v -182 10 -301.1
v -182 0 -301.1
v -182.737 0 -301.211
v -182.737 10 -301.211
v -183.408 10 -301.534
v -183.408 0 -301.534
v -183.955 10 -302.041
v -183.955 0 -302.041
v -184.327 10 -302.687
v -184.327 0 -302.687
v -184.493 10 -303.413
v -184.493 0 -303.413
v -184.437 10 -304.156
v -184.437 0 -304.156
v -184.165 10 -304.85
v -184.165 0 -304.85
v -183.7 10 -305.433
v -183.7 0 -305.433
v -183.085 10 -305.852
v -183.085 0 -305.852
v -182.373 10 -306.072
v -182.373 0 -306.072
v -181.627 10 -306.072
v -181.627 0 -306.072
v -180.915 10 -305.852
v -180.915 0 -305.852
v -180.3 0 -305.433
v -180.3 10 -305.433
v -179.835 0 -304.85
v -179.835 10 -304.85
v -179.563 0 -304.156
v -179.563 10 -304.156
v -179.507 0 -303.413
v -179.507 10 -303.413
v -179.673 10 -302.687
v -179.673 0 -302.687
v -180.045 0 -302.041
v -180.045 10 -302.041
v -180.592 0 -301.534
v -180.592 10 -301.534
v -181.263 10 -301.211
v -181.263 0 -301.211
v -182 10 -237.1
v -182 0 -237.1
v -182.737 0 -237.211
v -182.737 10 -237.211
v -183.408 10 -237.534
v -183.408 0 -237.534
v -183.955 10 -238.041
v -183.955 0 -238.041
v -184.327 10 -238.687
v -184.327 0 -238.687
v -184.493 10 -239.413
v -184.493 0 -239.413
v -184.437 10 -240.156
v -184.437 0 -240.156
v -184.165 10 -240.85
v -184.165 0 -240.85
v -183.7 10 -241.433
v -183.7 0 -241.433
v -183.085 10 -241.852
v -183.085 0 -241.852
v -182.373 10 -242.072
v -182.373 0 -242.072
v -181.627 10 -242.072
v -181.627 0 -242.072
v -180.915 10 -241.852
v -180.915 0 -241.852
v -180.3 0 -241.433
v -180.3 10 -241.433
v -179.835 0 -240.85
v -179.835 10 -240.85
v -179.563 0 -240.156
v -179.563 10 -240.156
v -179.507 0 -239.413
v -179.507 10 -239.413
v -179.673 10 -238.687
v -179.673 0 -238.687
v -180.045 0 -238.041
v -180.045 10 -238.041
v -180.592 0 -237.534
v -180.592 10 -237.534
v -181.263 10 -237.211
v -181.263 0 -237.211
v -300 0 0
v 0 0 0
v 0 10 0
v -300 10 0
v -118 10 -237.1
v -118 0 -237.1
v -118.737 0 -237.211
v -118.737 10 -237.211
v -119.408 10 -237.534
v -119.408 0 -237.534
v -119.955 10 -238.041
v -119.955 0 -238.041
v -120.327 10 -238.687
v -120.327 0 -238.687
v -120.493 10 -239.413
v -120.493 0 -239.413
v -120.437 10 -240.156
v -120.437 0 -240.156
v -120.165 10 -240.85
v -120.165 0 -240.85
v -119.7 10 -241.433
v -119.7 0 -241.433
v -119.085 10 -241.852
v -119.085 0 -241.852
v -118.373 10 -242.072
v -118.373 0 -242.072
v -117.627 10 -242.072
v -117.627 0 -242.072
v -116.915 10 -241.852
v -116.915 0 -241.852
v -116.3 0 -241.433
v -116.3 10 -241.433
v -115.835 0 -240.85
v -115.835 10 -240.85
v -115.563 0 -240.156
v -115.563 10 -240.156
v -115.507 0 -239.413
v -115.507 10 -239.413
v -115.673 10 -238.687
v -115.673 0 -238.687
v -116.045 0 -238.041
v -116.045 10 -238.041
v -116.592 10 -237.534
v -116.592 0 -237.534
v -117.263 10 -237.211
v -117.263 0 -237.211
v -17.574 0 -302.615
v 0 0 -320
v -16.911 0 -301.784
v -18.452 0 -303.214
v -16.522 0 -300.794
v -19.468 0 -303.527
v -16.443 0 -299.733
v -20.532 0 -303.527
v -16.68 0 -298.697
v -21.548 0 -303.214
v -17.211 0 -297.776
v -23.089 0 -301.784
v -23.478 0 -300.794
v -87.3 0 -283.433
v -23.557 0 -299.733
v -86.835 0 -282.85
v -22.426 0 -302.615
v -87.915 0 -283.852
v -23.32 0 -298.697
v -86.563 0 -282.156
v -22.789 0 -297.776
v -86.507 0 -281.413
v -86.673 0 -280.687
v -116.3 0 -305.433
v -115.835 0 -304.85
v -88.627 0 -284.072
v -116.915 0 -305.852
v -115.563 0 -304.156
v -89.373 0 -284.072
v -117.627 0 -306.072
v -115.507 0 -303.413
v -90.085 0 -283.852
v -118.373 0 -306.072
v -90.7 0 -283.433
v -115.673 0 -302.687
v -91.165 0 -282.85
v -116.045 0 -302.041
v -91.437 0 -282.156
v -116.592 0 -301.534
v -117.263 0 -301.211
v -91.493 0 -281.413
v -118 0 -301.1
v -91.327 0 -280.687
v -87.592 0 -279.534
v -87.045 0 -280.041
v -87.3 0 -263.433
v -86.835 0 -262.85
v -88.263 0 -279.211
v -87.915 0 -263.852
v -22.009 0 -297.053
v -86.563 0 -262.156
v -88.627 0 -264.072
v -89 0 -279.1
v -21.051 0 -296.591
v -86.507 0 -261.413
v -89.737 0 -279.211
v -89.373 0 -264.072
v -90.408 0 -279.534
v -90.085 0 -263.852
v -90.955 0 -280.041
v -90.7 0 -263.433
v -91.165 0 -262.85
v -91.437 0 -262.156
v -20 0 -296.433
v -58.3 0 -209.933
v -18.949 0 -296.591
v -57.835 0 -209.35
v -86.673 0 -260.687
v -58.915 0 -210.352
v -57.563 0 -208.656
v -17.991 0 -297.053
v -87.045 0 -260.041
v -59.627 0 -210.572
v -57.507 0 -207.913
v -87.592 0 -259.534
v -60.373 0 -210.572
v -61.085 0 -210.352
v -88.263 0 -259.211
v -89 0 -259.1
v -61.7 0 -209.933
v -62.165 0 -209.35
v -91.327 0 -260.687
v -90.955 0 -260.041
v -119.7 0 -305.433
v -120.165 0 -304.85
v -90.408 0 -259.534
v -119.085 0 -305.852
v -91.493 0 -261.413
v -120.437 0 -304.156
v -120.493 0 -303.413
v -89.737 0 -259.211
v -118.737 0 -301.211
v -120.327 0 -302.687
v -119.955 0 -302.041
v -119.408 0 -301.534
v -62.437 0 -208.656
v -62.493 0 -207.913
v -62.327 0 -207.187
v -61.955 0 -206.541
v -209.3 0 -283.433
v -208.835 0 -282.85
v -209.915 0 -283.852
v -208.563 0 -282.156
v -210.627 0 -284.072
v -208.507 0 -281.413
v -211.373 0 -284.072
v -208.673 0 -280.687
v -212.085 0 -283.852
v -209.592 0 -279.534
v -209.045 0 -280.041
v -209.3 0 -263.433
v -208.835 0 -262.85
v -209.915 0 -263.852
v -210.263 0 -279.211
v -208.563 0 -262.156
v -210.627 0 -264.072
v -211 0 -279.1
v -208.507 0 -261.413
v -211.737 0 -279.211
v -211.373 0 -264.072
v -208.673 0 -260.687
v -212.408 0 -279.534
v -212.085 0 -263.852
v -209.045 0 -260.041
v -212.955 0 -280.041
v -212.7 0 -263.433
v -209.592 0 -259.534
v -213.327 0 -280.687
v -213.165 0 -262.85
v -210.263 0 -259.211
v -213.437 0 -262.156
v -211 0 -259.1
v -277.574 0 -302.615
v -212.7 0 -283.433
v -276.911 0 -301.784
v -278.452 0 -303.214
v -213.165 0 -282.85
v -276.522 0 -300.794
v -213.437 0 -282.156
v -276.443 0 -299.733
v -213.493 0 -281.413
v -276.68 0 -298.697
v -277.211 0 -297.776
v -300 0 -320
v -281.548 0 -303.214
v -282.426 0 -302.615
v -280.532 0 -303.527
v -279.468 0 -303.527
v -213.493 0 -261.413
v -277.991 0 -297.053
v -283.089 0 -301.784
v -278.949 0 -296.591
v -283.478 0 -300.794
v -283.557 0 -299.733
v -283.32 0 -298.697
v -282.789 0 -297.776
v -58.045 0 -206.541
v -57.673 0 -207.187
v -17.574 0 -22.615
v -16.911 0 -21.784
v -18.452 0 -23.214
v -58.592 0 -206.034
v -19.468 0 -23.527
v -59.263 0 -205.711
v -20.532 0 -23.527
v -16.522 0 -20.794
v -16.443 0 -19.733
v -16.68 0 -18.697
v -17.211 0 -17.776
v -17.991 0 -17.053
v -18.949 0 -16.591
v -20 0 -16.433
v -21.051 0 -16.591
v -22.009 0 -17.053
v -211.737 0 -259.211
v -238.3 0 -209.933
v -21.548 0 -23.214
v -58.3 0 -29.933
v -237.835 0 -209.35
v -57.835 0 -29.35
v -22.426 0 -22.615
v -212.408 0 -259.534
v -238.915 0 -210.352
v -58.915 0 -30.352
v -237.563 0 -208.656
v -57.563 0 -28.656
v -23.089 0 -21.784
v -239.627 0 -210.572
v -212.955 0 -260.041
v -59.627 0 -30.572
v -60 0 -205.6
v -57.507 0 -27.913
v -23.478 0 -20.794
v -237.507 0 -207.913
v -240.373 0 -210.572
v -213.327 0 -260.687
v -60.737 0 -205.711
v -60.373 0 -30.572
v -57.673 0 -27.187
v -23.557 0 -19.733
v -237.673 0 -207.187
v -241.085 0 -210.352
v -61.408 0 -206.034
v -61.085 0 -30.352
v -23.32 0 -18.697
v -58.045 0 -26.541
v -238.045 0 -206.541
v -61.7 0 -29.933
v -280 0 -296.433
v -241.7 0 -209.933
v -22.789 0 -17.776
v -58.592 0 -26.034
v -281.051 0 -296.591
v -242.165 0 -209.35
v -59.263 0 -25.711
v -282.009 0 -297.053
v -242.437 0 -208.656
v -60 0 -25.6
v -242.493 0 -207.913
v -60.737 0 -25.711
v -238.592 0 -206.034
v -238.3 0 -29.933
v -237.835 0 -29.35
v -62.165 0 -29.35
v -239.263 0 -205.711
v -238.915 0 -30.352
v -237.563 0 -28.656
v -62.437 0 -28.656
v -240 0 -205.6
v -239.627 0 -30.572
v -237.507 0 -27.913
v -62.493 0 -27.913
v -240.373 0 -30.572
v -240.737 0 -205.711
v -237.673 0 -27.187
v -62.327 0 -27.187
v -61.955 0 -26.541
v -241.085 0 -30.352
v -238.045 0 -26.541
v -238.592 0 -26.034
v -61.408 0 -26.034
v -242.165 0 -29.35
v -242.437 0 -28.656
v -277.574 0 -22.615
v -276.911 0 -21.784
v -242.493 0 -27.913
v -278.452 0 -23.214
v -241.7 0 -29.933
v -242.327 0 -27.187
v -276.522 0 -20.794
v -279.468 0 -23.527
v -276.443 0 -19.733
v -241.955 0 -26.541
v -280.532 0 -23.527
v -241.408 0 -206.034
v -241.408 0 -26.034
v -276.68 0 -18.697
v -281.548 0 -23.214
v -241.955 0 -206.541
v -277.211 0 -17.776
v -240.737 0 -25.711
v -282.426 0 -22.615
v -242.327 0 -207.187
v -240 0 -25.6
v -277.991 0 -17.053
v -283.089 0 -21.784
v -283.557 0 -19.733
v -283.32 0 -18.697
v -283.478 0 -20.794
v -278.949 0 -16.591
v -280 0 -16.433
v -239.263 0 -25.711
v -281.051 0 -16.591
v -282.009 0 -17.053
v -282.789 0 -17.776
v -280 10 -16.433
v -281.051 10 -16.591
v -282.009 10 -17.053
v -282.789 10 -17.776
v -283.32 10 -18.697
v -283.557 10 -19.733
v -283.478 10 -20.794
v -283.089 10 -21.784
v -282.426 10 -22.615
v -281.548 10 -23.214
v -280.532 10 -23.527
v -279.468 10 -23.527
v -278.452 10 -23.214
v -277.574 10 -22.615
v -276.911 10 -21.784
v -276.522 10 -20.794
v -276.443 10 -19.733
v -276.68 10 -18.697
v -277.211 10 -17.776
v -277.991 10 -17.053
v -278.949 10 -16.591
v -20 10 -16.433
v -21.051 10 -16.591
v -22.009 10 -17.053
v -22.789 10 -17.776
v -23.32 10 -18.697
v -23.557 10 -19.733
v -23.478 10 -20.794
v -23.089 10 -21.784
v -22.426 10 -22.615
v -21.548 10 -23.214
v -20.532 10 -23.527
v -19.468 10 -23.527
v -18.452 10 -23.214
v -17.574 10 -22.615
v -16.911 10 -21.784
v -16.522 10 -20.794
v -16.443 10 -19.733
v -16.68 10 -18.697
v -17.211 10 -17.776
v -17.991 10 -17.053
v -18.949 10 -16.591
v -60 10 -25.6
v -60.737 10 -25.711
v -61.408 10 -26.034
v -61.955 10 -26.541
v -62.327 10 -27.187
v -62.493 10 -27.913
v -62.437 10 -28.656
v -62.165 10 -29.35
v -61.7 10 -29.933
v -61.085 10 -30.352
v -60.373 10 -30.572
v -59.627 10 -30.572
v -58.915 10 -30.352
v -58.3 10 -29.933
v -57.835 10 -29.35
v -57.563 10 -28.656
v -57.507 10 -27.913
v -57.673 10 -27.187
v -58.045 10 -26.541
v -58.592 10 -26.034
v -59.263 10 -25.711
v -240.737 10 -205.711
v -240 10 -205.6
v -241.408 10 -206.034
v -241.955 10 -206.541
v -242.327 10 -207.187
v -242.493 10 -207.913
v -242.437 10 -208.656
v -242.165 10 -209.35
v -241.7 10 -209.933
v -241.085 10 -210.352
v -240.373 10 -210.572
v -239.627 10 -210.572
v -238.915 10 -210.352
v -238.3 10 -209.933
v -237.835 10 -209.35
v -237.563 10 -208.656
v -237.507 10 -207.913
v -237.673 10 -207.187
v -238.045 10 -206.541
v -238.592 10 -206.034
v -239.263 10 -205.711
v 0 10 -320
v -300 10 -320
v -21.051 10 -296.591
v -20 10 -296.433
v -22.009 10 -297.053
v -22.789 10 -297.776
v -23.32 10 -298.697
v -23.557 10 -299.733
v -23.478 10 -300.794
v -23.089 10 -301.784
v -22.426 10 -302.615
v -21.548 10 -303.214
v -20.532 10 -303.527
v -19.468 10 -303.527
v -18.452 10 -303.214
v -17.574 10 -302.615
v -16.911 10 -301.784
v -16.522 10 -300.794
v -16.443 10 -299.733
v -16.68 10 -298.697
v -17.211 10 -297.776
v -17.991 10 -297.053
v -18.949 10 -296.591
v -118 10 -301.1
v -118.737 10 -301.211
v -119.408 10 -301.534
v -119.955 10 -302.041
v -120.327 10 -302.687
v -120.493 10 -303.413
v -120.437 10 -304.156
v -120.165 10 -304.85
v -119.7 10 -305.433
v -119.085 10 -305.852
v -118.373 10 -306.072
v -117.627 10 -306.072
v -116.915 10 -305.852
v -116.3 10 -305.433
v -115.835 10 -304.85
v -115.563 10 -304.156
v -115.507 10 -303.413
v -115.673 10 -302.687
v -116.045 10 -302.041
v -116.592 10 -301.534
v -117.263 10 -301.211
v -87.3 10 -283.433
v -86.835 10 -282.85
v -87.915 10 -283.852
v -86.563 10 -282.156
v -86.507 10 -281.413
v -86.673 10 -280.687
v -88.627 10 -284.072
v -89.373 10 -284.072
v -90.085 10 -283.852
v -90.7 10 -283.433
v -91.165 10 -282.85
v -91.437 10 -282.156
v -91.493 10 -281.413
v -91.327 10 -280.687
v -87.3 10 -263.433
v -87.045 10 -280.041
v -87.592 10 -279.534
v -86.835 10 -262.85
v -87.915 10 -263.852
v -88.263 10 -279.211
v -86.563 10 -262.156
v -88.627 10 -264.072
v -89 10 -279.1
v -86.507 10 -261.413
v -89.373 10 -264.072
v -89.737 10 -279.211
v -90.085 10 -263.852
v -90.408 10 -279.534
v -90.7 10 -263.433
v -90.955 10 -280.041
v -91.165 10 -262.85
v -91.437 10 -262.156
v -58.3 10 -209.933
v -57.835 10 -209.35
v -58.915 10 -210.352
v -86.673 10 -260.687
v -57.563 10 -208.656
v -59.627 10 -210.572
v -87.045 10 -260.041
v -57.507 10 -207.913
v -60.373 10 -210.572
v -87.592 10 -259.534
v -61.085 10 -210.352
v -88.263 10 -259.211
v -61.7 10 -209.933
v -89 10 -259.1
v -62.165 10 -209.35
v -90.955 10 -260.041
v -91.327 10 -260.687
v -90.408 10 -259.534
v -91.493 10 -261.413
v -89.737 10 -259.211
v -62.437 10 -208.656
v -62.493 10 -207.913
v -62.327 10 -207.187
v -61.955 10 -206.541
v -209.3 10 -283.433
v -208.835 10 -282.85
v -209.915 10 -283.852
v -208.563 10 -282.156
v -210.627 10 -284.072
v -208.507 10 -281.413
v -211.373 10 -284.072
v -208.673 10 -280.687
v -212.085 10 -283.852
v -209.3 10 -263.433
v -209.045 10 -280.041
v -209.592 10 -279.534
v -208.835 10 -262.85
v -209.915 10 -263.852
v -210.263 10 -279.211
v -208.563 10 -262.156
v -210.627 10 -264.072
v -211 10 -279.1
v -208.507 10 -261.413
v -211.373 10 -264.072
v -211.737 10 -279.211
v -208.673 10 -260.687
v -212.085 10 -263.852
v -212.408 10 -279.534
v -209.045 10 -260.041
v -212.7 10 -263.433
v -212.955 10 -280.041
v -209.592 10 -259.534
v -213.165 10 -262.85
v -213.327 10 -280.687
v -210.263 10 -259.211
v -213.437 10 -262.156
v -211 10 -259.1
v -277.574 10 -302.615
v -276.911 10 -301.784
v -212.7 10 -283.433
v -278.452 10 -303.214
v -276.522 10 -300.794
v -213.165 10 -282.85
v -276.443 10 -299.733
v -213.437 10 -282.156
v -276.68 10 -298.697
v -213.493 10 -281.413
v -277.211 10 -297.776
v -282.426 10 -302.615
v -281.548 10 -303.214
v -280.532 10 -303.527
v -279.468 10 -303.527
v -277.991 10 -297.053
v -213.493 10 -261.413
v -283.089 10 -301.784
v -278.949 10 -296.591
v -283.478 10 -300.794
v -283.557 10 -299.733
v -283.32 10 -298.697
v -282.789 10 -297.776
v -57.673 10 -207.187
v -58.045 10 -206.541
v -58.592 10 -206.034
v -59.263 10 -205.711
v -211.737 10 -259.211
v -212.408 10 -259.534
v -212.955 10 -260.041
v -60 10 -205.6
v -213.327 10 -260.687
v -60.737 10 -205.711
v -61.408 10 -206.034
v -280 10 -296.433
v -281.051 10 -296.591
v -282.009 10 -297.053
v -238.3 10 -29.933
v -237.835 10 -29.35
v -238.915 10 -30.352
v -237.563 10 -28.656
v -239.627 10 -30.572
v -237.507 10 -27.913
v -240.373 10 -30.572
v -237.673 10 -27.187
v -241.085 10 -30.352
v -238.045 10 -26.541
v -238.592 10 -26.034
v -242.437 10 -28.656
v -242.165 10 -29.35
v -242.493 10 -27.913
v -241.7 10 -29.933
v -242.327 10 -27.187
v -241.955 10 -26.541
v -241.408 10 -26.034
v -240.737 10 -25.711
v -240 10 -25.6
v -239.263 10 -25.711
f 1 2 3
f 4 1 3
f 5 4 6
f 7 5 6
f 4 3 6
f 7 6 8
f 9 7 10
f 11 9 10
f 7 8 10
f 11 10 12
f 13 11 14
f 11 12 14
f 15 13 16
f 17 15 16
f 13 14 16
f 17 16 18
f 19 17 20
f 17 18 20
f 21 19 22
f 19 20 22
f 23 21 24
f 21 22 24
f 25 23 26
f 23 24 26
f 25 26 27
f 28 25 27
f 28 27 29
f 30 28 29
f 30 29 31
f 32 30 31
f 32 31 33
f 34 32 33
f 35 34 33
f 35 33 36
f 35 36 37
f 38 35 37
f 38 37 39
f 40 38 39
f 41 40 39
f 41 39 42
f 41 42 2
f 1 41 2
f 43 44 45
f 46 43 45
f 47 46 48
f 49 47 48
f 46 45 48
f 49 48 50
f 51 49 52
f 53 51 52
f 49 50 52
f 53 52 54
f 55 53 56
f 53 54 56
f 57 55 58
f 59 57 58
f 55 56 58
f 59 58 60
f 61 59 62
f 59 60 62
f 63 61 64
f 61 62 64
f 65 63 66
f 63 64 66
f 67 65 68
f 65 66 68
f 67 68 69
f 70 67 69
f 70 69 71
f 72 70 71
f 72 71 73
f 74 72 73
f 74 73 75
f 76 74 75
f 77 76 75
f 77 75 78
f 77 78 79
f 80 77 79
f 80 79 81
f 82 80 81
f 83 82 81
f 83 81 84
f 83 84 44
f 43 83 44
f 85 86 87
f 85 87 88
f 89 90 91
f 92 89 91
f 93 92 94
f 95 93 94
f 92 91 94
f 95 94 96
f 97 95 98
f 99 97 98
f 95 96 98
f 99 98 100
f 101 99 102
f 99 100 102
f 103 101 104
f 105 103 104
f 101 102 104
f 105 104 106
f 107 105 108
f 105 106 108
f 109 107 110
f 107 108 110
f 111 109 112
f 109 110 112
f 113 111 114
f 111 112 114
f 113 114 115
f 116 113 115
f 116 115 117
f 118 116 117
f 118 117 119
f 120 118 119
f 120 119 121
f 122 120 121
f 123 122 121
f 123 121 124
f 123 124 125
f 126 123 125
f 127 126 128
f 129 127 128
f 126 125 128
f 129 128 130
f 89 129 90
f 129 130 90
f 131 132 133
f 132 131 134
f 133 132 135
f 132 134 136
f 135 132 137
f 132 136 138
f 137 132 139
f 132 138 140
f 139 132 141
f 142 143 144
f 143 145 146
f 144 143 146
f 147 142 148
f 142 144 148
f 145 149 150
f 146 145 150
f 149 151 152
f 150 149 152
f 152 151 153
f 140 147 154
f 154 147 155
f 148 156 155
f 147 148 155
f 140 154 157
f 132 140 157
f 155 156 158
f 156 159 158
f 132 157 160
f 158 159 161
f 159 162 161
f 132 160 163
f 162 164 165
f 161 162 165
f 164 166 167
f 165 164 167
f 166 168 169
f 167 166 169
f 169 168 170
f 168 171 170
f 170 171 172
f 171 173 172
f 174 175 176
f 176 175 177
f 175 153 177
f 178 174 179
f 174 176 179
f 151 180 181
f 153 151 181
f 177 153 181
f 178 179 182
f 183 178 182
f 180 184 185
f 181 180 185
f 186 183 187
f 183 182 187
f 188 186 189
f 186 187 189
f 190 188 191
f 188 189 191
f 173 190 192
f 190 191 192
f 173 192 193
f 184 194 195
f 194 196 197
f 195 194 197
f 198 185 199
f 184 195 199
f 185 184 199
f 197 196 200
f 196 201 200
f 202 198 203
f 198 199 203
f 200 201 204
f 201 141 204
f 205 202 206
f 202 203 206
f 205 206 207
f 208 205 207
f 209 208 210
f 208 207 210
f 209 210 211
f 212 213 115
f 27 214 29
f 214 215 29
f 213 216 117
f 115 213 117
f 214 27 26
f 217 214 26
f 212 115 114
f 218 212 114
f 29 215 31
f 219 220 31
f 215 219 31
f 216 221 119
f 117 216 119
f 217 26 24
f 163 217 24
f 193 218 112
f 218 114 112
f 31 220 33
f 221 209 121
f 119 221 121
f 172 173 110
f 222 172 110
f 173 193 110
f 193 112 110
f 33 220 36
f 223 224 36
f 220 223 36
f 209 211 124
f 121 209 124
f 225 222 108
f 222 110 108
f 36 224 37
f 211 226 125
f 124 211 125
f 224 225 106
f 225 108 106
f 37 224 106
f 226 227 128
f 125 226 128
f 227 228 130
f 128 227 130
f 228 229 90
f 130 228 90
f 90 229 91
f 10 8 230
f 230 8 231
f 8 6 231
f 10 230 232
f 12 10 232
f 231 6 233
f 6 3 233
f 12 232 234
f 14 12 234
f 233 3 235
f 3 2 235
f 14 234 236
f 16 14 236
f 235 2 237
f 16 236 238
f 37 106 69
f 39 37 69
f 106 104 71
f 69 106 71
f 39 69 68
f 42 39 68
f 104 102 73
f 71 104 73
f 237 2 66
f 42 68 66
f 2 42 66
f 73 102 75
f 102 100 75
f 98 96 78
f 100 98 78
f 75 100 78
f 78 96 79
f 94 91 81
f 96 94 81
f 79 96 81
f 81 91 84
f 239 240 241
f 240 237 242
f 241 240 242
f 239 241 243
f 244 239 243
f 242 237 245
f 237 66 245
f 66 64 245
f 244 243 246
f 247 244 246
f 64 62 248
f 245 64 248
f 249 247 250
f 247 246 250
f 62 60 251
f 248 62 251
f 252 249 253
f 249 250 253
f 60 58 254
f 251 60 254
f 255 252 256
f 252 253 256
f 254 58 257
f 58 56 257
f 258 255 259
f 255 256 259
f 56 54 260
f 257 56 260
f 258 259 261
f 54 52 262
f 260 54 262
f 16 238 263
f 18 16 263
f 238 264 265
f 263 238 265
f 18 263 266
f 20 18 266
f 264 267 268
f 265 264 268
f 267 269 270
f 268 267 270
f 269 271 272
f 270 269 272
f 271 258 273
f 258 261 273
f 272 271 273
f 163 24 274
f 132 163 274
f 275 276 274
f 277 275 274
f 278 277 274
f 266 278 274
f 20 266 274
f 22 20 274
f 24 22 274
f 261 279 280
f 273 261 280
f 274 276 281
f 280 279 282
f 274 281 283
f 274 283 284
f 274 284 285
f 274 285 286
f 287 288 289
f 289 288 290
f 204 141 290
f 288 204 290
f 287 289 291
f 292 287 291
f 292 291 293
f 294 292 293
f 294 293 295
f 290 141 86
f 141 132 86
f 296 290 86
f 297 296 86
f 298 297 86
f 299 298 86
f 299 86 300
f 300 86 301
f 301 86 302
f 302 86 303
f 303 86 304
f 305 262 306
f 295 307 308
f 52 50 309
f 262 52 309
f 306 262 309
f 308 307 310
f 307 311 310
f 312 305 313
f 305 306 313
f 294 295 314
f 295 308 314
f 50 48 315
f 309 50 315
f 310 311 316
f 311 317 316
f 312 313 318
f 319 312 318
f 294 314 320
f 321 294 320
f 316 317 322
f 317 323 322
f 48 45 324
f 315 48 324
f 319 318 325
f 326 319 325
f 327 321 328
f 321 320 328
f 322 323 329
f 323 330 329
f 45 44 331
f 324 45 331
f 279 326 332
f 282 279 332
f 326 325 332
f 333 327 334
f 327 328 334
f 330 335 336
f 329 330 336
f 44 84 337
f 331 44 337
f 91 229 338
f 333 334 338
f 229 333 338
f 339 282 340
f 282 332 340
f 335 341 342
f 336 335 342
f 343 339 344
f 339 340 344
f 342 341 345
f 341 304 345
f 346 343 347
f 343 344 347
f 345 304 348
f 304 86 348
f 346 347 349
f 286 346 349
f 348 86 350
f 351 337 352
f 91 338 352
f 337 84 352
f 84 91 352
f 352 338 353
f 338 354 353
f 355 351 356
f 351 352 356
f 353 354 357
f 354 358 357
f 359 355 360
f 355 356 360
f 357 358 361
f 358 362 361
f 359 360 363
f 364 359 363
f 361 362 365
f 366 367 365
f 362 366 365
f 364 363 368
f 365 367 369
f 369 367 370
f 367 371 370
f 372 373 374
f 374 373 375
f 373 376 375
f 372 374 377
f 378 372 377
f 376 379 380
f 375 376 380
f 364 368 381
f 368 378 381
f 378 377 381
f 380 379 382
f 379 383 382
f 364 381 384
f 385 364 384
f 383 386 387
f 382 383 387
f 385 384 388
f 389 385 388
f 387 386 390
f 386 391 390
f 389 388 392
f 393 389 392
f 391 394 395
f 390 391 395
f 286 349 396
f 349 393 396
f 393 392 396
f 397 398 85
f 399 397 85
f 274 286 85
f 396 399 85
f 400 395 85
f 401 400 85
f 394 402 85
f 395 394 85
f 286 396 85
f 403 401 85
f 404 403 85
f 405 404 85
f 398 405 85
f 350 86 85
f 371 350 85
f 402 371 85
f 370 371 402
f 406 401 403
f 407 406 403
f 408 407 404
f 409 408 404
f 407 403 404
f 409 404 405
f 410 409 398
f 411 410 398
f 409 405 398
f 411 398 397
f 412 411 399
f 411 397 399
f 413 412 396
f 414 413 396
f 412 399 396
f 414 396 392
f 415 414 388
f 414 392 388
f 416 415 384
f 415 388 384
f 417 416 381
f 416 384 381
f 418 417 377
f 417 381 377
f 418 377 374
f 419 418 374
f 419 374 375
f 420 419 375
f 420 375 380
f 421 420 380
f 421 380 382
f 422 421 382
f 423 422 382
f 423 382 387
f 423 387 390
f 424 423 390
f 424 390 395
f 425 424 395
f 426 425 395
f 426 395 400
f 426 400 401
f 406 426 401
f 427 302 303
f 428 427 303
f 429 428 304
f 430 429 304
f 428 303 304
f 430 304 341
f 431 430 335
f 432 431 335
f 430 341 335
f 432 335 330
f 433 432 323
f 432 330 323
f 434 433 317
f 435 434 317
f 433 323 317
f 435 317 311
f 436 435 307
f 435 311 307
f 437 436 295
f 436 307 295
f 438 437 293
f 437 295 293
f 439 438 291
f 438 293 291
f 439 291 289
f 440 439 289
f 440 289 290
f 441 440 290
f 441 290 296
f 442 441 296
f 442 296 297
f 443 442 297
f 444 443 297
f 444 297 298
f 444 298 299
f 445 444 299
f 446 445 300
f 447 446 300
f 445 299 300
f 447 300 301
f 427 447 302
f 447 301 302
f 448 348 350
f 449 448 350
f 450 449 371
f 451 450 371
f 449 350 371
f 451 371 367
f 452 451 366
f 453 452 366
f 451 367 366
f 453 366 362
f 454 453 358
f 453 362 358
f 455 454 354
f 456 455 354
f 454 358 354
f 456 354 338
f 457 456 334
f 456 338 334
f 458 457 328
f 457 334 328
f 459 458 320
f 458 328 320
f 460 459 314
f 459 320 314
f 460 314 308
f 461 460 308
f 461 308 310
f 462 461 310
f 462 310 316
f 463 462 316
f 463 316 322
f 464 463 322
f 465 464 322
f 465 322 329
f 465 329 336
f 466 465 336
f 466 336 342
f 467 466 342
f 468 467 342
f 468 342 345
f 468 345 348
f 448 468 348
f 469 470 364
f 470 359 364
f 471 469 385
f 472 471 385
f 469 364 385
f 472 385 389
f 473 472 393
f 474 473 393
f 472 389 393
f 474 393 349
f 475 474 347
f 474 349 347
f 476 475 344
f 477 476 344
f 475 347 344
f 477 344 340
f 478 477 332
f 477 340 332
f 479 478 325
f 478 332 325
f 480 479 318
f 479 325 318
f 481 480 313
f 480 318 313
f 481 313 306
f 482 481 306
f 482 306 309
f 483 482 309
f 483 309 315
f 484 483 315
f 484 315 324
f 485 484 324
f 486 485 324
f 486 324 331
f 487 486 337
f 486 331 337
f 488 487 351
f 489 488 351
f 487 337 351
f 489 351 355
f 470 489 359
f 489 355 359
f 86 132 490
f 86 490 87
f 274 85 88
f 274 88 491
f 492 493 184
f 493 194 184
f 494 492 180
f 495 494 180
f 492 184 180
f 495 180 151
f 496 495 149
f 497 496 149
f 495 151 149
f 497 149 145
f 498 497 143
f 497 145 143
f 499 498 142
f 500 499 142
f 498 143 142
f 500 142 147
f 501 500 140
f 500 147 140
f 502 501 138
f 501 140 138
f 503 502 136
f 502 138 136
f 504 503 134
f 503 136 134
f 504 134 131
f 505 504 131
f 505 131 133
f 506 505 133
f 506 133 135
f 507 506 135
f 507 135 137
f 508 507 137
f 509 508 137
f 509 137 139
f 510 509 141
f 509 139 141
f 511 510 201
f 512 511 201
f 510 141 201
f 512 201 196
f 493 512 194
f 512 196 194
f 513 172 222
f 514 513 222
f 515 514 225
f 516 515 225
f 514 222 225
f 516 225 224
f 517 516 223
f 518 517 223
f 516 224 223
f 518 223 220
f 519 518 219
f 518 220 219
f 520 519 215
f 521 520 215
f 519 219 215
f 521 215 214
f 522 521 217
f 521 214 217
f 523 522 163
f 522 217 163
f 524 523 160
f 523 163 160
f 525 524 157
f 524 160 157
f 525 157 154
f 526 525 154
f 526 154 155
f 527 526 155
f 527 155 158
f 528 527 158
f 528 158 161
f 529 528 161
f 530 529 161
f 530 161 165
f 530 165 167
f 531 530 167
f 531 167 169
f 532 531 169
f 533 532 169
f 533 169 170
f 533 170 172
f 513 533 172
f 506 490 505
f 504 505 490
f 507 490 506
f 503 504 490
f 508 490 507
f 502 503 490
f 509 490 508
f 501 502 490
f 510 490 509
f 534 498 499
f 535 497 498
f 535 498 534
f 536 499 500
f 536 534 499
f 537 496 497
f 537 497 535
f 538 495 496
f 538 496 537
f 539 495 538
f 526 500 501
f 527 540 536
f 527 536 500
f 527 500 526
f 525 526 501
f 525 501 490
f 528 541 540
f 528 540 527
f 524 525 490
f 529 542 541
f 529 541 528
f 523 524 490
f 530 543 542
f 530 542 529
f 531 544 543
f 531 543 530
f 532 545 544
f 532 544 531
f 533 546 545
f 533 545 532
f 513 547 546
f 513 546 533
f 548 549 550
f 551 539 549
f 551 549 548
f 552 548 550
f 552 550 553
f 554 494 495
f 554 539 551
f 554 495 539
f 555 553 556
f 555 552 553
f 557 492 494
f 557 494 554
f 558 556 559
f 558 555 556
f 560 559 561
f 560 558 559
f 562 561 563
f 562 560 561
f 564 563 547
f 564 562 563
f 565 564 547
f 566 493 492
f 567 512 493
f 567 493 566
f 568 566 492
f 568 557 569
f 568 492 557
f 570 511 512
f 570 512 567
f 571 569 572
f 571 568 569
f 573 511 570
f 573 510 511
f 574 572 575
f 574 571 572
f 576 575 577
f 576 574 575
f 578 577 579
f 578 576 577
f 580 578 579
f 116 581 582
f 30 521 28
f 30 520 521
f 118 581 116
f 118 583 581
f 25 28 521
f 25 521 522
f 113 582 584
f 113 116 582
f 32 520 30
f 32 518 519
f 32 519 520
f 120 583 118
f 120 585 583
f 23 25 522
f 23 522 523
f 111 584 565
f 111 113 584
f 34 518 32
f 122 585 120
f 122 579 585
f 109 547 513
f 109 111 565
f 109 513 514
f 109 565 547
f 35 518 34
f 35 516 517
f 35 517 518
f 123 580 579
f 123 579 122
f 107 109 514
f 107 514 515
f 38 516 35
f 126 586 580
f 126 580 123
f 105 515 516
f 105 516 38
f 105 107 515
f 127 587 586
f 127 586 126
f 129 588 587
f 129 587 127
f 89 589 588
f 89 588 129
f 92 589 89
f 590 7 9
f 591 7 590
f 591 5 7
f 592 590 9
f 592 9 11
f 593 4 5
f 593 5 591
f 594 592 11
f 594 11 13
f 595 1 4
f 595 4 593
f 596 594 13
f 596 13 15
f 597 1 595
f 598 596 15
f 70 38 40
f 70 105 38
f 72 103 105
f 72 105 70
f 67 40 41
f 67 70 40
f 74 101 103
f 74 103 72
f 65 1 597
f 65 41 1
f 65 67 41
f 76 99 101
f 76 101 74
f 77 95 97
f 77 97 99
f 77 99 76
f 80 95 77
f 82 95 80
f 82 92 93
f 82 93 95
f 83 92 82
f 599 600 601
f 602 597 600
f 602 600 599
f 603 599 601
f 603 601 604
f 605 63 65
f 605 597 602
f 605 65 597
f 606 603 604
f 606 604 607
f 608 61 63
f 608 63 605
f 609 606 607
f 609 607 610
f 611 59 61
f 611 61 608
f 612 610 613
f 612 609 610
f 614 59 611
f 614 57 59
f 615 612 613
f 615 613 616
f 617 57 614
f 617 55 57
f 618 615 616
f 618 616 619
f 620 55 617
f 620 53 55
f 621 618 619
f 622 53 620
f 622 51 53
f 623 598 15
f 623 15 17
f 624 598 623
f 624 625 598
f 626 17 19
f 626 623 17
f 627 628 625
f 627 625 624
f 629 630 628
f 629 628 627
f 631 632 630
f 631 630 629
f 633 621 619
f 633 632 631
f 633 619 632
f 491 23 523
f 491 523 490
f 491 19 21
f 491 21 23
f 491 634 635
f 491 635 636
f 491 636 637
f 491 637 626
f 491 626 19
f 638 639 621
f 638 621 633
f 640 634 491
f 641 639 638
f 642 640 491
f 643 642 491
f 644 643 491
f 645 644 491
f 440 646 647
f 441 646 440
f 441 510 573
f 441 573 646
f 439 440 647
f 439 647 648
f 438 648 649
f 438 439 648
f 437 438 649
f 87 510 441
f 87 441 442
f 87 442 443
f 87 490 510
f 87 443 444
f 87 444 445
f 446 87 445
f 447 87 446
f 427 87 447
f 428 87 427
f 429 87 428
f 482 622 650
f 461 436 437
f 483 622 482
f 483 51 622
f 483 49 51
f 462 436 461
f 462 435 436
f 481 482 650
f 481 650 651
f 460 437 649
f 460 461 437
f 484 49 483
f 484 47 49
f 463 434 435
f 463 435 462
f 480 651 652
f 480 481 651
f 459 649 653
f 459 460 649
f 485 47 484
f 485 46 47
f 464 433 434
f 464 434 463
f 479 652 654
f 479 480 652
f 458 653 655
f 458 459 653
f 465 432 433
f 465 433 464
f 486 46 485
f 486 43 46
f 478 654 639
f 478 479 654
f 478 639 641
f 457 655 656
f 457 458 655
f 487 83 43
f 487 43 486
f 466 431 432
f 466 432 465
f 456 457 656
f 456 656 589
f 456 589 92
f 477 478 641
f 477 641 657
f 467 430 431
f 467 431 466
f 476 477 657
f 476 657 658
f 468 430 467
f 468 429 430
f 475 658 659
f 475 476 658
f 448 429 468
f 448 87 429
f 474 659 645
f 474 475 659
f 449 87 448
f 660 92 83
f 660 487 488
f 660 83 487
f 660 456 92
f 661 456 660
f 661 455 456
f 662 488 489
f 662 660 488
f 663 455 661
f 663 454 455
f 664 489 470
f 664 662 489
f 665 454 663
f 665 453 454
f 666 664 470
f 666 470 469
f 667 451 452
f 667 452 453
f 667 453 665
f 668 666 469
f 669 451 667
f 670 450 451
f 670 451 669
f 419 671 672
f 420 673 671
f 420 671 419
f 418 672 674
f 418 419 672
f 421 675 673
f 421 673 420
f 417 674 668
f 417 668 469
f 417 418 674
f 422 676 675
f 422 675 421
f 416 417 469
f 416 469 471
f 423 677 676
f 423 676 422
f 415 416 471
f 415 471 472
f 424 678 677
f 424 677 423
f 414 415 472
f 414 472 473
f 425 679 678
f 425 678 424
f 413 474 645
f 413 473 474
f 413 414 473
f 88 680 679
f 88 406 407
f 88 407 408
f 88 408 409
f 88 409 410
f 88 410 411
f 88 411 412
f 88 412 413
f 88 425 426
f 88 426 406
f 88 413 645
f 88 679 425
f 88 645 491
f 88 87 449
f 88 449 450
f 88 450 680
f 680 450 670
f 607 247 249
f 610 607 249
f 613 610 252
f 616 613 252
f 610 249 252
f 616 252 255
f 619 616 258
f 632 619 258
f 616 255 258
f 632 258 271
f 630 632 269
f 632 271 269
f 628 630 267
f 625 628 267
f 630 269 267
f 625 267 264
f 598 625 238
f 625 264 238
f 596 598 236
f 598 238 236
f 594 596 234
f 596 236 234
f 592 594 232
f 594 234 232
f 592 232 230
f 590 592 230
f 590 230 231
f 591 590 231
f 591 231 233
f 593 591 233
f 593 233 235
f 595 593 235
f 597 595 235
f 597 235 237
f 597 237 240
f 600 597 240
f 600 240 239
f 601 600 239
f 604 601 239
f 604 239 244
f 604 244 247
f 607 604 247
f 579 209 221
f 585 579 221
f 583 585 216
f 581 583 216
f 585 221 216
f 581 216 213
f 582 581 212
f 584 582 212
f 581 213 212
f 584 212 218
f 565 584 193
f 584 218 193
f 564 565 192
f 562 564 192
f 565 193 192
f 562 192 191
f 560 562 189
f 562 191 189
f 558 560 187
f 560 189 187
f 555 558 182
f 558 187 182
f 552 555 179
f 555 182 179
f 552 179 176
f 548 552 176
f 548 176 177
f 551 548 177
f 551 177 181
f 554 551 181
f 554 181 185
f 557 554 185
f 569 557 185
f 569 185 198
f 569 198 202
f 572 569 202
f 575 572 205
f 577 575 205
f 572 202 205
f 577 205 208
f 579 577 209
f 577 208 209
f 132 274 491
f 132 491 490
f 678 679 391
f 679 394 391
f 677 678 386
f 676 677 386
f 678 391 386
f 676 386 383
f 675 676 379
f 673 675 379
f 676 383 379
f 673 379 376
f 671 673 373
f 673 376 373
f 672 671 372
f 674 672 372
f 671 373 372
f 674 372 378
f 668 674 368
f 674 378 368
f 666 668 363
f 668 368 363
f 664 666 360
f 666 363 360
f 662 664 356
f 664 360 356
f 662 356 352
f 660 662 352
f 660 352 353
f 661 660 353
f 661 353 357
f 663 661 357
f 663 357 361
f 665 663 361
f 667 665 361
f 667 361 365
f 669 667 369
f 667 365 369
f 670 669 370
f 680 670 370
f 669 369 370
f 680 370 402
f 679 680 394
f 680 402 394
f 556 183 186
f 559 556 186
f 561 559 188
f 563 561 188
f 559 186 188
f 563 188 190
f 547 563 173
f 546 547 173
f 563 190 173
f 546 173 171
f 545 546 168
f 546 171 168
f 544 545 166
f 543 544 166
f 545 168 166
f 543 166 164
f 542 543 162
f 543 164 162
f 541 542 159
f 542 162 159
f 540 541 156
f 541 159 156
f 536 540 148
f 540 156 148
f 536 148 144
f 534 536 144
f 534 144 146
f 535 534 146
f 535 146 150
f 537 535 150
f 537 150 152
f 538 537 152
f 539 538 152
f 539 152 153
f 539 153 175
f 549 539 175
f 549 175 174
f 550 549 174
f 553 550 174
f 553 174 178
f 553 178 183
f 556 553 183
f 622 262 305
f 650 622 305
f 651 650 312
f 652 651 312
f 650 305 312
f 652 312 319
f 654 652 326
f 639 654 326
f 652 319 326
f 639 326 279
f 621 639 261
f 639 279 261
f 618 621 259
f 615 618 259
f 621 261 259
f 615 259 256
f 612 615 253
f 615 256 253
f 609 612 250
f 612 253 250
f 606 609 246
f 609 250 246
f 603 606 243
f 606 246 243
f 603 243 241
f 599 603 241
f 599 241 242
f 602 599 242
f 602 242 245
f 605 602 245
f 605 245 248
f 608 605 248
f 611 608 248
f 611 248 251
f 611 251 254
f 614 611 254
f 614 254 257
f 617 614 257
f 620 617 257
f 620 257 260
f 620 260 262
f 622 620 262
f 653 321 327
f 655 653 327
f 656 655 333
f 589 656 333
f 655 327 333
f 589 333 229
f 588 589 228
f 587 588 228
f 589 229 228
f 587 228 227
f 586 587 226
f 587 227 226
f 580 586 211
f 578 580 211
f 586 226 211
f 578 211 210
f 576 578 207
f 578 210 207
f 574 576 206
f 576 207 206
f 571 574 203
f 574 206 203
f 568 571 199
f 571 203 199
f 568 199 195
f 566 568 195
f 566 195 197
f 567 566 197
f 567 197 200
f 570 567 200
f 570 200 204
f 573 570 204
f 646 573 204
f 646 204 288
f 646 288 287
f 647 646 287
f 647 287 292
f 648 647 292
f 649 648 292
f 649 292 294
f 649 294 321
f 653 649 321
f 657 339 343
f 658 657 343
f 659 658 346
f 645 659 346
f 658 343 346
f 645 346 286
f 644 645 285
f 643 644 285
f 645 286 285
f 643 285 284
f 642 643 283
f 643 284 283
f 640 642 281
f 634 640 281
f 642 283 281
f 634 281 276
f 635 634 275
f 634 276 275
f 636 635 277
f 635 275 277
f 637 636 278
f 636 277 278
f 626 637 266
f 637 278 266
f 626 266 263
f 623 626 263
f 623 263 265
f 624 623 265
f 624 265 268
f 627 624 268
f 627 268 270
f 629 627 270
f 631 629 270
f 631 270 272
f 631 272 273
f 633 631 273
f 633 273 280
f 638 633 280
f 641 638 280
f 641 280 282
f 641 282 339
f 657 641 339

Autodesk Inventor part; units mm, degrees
ref_plane "YZ Plane" through (0, 0, 0) normal (1, 0, 0) x (0, 1, 0)
ref_plane "XZ Plane" through (0, 0, 0) normal (0, 1, 0) x (-1, 0, 0)
ref_plane "XY Plane" through (0, 0, 0) normal (0, 0, 1) x (1, 0, 0)
sketch "Esboço1" plane through (0, 0, 0) normal (0, 1, 0) x (-1, 0, 0)
  line L0 (0, 0) -> (300, 0)
  line L1 (300, 0) -> (300, -320)
  line L2 (300, -320) -> (0, -320)
  line L3 (0, -320) -> (0, 0)
  dimension "d0" = 300
  dimension "d1" = 320
extrude "Extrusão1" add sketch "Esboço1" along normal blind 10
sketch "Sketch2" plane through (0, 10, 0) normal (0, 1, 0) x (1, 0, 0)
  line L0 (-300, 320) -> (-300, 0)
  line L1 (-300, 0) -> (0, 0)
  line L2 (0, 320) -> (-300, 320)
  line L3 (0, 0) -> (0, 320)
  point P0 (-182, 239.6)
  point P1 (-182, 303.6)
  point P2 (-118, 239.6)
  point P3 (-118, 303.6)
  point P4 (-211, 281.6)
  point P5 (-89, 281.6)
  point P6 (-211, 261.6)
  point P7 (-89, 261.6)
  point P8 (-240, 28.1)
  point P9 (-240, 208.1)
  point P10 (-60, 28.1)
  point P11 (-60, 208.1)
  dimension "d16" = 64
  dimension "d17" = 64
  dimension "d18" = 300
  dimension "d19" = 320
  dimension "d20" = 16.4
  dimension "d21" = 118
  dimension "d22" = 122
  dimension "d23" = 20
  dimension "d24" = 38.4
  dimension "d25" = 89
  dimension "d26" = 180
  dimension "d27" = 180
  dimension "d28" = 60
  dimension "d29" = 28.1
hole "Hole1" at (-60, 10, -208.1) at (-60, 10, -28.1) at (-240, 10, -208.1) at (-240, 10, -28.1) at (-89, 10, -261.6) at (-211, 10, -261.6) at (-89, 10, -281.6) at (-211, 10, -281.6) at (-118, 10, -303.6) at (-118, 10, -239.6) at (-182, 10, -303.6) at (-182, 10, -239.6) direction (0, -1, 0) diameter 5 end through all
sketch "Sketch3" plane through (0, 10, 0) normal (0, 1, 0) x (1, 0, 0)
  line L0 (-300, 320) -> (-300, 0)
  line L1 (-300, 0) -> (0, 0)
  point P0 (-280, 20)
  point P1 (-280, 300)
  point P2 (-20, 20)
  point P3 (-20, 300)
  dimension "d41" = 280
  dimension "d42" = 260
  dimension "d43" = 320
  dimension "d44" = 300
  dimension "d45" = 20
  dimension "d46" = 20
hole "Hole2" at (-20, 10, -300) at (-20, 10, -20) at (-280, 10, -300) at (-280, 10, -20) direction (0, -1, 0) diameter 7.134 end through all thread size "M8x0.8" class "6H" standard "ISO Metric profile"
equation "\"d21\" = -0.5 * d17 + 0.5 * d18"
equation "\"d25\" = 0.5 * d18 - 0.5 * d22"
equation "\"d28\" = 0.5 * d18 - 0.5 * d27"
equation "\"d35\" = Espessura"
equation "\"d45\" = 0.5 * d43 - 0.5 * d41"
equation "\"d46\" = 0.5 * d44 - 0.5 * d42"
equation "\"Raio_vergadura\" = Espessura"
equation "\"Largura_alívio_de_vergadura\" = Espessura"
equation "\"Profundidade_alívio_de_vergadura\" = 0.5 * Espessura"
equation "\"Tamanho_alívio_de_dobra\" = 4 * Espessura"
equation "\"Remanescente_mínimo\" = 2 * Espessura"
equation "\"Raiodetransição\" = Raio_vergadura"
equation "\"Tamanho_de_raio_de_Jacobi\" = Raio_vergadura"
equation "\"TamanhoFolga\" = Espessura"
equation "\"Espessura\" = 0.5"
properties part number "Base madeira" material "Wood (Oak)"
